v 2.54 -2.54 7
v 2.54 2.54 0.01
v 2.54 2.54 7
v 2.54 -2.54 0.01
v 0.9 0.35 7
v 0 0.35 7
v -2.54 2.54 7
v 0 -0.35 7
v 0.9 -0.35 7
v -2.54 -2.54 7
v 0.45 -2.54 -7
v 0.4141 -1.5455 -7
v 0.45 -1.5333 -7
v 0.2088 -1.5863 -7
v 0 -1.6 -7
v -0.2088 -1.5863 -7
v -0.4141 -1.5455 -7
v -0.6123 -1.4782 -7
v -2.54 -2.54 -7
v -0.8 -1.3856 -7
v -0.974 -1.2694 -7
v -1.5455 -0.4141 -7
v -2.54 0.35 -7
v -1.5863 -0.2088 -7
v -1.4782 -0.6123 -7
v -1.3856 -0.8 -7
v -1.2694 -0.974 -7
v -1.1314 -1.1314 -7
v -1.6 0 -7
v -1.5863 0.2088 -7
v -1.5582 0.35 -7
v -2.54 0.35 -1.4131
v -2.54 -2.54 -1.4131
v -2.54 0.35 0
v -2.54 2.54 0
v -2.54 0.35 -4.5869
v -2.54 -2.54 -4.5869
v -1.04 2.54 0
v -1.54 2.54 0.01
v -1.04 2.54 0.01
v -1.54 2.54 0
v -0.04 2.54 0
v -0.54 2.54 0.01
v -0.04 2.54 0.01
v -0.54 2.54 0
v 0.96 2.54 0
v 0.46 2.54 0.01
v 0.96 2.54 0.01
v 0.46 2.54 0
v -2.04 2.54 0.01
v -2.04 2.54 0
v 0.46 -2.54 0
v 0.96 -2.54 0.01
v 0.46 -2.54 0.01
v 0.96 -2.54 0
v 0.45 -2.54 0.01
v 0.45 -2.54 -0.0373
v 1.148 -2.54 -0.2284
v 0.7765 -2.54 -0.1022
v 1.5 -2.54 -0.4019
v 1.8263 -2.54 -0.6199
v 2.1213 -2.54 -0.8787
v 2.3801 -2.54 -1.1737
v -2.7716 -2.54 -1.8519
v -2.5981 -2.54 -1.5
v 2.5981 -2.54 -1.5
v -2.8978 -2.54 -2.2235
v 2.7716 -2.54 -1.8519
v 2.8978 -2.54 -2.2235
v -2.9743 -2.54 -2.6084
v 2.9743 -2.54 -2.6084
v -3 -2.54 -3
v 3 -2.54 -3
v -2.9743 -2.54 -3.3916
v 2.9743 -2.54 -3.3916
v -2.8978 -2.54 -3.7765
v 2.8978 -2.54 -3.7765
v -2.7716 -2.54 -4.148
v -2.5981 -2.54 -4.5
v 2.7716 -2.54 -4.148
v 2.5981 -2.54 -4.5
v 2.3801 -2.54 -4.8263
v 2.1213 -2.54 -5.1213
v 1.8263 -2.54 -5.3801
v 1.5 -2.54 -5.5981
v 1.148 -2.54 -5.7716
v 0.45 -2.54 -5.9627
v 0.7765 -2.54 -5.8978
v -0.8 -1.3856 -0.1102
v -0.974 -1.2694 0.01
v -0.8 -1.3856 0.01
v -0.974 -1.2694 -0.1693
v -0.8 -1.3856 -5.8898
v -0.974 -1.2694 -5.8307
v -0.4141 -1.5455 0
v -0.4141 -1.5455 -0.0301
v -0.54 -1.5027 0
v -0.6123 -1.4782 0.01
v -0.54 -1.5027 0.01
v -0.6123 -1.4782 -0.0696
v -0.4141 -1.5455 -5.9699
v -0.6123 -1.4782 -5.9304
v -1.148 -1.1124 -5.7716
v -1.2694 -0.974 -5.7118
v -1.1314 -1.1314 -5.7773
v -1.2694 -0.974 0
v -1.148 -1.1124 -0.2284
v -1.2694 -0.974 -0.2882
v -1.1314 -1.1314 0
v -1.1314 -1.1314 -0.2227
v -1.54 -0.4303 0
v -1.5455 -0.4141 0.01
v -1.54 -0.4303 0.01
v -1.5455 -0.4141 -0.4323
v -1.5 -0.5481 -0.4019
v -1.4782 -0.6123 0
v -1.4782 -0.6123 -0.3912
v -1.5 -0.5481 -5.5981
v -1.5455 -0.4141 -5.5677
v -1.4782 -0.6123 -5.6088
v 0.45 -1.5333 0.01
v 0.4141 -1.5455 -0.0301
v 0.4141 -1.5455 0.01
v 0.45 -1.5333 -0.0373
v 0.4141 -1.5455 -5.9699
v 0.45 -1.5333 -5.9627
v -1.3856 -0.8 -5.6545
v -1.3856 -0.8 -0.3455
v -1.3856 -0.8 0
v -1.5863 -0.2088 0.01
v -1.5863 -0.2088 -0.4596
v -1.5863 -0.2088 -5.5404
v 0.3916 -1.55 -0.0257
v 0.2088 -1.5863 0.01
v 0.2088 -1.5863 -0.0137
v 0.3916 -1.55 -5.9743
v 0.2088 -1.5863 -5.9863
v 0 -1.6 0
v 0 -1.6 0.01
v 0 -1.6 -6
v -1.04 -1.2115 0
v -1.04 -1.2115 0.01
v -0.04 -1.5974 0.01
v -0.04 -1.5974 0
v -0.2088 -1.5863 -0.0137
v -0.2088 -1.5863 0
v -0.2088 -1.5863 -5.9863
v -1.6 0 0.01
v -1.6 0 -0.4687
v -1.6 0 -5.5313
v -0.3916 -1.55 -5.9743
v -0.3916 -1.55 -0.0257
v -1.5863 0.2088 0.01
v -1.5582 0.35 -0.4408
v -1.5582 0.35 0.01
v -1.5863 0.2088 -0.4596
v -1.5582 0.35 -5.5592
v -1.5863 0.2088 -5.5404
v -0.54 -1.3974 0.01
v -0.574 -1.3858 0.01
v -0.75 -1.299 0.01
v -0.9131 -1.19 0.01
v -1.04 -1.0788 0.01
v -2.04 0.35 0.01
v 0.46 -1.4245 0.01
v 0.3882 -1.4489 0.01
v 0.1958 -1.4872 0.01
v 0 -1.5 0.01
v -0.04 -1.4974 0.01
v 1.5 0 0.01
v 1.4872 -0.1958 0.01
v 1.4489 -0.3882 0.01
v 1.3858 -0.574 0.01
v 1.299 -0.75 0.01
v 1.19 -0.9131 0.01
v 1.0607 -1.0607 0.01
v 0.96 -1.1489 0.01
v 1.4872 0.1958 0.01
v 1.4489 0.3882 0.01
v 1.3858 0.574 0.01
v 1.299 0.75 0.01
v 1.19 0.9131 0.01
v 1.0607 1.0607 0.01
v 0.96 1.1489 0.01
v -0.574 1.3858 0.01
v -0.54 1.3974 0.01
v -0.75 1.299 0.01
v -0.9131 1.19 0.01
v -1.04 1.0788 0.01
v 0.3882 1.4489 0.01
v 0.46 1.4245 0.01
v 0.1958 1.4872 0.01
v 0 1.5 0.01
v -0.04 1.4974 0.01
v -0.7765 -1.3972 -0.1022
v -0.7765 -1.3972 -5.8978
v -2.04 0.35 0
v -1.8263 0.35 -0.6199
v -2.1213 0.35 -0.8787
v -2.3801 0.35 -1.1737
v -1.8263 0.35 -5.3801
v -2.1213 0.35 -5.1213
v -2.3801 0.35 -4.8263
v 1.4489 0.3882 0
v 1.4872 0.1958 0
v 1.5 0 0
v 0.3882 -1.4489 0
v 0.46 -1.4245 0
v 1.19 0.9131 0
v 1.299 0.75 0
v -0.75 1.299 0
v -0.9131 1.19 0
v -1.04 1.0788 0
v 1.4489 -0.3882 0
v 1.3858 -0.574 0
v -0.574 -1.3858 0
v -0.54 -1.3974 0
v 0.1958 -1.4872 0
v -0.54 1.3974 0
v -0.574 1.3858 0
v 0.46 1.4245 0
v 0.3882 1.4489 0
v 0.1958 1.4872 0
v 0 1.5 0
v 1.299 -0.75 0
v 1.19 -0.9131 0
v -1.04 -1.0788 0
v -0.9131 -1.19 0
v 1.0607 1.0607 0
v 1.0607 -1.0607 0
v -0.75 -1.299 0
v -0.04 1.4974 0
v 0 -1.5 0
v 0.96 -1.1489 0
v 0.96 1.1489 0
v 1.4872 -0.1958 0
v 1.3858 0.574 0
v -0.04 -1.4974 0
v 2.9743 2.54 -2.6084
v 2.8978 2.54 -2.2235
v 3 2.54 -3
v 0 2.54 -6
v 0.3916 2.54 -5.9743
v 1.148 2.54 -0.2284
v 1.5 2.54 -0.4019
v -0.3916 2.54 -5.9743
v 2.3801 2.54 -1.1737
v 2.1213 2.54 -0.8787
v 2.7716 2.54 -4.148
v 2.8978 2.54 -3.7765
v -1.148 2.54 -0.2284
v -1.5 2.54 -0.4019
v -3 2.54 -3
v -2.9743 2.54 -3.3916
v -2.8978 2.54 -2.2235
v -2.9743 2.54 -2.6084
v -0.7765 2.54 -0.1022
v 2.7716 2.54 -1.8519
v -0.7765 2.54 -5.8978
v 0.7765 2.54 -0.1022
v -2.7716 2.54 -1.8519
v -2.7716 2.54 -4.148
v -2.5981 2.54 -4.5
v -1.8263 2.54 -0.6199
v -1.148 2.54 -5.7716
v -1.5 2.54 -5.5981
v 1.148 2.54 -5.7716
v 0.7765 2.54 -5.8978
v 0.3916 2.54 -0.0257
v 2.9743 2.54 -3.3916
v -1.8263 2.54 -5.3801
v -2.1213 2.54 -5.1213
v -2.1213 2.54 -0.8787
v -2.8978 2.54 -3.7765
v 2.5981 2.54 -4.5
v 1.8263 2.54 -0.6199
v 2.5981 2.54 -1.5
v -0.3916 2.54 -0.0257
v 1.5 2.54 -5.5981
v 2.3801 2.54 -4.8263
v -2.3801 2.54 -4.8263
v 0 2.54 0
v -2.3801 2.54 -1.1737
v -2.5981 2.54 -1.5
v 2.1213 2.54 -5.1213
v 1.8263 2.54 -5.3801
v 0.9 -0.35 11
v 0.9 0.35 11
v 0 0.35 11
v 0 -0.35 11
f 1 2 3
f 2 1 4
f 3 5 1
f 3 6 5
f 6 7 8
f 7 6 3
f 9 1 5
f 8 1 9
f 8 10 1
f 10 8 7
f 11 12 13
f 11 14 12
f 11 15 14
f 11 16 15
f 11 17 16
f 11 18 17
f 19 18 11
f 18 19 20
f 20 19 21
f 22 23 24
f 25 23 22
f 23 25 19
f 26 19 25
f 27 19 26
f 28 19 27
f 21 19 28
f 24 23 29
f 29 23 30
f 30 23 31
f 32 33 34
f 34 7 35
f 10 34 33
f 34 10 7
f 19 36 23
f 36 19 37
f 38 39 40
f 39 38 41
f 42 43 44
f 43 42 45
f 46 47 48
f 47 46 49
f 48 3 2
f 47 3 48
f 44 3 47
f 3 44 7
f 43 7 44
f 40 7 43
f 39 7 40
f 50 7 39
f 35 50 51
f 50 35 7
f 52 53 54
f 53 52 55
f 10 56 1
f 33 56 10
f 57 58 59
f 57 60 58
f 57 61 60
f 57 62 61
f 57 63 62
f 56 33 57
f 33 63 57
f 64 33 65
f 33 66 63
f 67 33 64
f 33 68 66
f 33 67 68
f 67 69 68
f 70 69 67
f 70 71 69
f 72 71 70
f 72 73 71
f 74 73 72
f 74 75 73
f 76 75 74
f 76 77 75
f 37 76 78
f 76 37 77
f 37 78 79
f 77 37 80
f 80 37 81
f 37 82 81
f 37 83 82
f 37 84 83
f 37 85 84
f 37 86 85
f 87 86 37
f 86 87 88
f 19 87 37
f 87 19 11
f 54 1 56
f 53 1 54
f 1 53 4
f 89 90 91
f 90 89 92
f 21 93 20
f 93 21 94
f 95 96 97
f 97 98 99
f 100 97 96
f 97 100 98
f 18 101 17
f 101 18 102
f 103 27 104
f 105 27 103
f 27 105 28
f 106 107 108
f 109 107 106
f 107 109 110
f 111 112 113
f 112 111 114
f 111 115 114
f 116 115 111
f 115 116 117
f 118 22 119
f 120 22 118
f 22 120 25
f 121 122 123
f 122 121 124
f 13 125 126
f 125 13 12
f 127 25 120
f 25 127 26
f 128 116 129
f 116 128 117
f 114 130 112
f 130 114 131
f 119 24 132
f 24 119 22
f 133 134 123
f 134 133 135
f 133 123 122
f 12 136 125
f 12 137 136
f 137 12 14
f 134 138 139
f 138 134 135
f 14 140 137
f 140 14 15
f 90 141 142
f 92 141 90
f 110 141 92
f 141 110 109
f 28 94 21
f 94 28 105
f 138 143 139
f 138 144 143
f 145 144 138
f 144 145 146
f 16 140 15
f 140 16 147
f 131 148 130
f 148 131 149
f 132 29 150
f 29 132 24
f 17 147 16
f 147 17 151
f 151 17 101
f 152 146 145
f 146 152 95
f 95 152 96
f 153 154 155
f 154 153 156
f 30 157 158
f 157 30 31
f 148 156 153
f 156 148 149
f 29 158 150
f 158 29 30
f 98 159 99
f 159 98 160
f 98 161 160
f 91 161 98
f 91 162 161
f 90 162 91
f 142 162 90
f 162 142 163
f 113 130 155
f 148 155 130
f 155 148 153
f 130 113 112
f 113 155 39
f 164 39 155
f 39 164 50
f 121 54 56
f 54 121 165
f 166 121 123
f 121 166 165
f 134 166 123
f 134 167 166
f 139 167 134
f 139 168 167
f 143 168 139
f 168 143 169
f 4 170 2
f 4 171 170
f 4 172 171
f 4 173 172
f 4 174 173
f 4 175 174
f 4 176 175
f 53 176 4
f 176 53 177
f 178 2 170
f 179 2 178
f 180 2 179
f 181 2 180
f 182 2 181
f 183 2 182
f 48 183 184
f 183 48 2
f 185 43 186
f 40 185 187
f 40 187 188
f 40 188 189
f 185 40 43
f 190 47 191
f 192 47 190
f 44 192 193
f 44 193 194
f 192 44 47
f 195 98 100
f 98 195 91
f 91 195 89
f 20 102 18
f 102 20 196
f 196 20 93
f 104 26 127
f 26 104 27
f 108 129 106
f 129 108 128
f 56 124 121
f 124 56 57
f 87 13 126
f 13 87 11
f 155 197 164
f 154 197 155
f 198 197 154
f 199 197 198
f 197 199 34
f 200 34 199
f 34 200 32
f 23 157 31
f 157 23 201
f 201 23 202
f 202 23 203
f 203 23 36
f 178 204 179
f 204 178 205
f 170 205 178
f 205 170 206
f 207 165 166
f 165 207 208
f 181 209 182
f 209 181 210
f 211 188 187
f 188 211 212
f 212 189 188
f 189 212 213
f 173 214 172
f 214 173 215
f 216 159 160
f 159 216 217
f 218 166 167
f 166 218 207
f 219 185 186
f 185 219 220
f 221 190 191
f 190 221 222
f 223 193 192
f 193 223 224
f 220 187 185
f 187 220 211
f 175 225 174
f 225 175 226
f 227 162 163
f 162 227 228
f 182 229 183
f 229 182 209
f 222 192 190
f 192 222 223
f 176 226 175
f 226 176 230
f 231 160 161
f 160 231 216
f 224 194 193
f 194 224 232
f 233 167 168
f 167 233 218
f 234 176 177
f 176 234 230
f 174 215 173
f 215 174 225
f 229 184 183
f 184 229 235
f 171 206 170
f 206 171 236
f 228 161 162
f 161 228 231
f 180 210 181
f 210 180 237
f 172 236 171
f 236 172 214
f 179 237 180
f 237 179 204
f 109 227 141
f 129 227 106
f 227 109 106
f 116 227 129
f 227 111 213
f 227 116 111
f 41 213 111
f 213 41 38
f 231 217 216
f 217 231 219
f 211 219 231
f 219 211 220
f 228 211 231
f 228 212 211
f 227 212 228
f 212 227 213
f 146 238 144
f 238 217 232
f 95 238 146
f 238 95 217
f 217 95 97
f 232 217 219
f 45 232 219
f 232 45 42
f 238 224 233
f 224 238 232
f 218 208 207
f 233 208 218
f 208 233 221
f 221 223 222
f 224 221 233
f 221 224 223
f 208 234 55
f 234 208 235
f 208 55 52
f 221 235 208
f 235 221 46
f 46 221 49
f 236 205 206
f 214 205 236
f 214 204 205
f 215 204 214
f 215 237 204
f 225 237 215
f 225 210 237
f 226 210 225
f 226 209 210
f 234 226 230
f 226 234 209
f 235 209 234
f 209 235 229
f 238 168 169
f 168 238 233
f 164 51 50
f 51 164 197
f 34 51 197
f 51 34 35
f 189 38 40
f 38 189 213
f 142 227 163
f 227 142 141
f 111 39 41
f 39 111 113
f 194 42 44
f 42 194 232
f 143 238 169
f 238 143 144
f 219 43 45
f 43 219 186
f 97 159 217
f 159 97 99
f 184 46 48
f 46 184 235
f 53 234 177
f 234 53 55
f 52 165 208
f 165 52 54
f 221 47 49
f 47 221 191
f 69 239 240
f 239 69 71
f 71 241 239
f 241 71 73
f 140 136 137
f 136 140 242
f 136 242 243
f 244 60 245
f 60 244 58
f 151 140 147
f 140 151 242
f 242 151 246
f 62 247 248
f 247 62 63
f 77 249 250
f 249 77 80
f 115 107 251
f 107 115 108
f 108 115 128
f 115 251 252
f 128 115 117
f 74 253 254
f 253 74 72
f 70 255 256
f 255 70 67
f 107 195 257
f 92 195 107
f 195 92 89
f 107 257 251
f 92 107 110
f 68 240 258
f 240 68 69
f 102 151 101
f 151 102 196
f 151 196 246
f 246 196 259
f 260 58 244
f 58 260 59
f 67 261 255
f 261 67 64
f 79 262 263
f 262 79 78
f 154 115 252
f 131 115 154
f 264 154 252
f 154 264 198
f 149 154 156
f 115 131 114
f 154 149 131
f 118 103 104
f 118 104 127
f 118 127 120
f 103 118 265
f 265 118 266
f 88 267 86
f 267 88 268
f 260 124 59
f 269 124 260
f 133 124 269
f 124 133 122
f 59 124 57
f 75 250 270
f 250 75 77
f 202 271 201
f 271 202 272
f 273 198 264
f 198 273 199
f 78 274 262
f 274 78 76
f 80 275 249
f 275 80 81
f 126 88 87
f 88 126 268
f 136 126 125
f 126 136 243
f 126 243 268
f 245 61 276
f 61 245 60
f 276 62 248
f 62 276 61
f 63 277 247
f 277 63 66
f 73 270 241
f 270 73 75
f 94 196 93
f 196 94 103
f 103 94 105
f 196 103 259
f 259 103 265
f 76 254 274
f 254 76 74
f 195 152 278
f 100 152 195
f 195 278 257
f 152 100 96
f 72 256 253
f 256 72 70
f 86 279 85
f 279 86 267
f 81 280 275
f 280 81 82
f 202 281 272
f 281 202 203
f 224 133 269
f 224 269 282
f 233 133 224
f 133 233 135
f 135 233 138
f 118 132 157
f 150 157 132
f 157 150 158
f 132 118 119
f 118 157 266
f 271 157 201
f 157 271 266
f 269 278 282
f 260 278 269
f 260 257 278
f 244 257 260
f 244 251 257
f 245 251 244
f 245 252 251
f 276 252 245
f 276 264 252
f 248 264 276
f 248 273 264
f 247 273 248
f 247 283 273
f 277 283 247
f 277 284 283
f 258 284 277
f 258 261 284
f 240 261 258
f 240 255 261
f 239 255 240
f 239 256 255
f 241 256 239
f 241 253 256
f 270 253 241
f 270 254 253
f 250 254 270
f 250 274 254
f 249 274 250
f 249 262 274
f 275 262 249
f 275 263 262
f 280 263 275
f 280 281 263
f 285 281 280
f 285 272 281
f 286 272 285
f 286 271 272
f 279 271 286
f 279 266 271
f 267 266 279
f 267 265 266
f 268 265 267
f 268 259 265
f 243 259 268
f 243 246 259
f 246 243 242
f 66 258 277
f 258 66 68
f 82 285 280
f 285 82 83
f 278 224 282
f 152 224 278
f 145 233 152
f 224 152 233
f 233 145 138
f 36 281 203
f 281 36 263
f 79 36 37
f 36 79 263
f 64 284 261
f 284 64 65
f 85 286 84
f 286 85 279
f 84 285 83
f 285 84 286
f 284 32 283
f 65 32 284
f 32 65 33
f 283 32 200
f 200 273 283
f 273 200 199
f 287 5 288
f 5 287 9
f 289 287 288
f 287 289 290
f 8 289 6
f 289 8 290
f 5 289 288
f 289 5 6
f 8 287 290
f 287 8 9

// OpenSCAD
// design calculation S5-R register unit cell -- CAD evidence for the dropout latch.
//
// This is a SINGLE-COLUMN unit cell of the shared-drive programmable rotary
// register (the S5-R pivot). It is NOT a full machine and NOT a print. Its job
// is to let the analytic printability gate read the declared feature sizes and
// to let a real OpenSCAD render + mesh-validate that the latch + rotor bank
// geometry is a closed solid at the 5.08 mm pitch.
//
// The constants below are the source of truth parsed by
// tools/validate/analytic_printability.py and recomputed by s5r_register.py.
// Keep the two in sync.
//
// EVIDENCE CLASS: CAD (this file + its STL render). Not a print, not a
//
// Units: mm. Target process: Bambu X1C, PLA, 0.4 mm nozzle (tools/fdm-limits).

PITCH = 5.08;
ROTOR_RADIUS = 1.5;
ROTOR_CORE_RADIUS = 1.0;
BASE = 2.0;
LEVELS = 5;
LEVEL_ANGLE = 360 / LEVELS;     // 72 deg

// ---- printed drive pawl (vertical cantilever, load-bearing = 2 lines) ----
PAWL_T = 0.90;                  // thickness in X (pitch direction); 2 lines
PAWL_W = 0.70;                  // width in Y (row direction)
PAWL_LEN = 8.00;                // Z extent of the cantilever
PAWL_DEFLECT = 0.10;            // working deflection off the rack tooth

// ---- keeper latch (bistable over-centre leaf, 5-position gate) ----
// design calculation re-profile (residual-KEEPER): 0.45 (1 line, RISK) -> 0.90 mm (2 lines,
// PASS); the HOLD is a hard printed shoulder in compression, so the leaf only
// trips the snap. A longer leaf (4.00) keeps the snap strain low.
KEEPER_T = 0.90;                // thickness in X (2 lines; PASS)
KEEPER_W = 0.70;                // width in Y
KEEPER_LEN = 4.00;              // Z cantilever
KEEPER_OVER_CENTRE = 0.06;      // bistability offset (snap trip only)
KEEPER_GATE_STEP = 0.35;        // spacing of the 5 gate positions
KEEPER_SHOULDER_X = 0.50;       // hard shoulder depth in X (hold, compression)

// ---- shared drive bar with rack ----
// design calculation (from design calculation bank close-out): design calculation's rack (pitch 0.60, tooth 0.45)
// left a 0.15 mm inter-tooth gap that FUSES at a 0.4 mm nozzle (< 0.44 mm line).
// Re-dimensioned to pitch 1.00 / tooth 0.50 -> 0.50 mm gap. The per-stroke
// advance is therefore 1.00 mm (one tooth) instead of 0.60 mm.
RACK_TOOTH_PITCH = 1.00;
RACK_TOOTH_HEIGHT = 0.50;
BAR_D = 6.0;                    // sourced steel drive rod d=6 (design calculation); a round bar
BAR_H = BAR_D;                  // (round steel; replaces the 3x2 printed placeholder)
BAR_W = PITCH;                  // bar spans one column here; real bar is 80xR

// ---- housing ----
CELL_H = 7.0;
WALL = 0.90;                    // robust infill-free wall (>= 2 lines)
SLOT_CLEAR = 0.15;              // guide clearance (worst case >= 0.20 after print)
ROTOR_BORE_CLEAR = 0.40;        // total diametral rotor-to-bore free play

$fn = 48;
EPS = 0.01;

module rotor() {
    cylinder(r = ROTOR_RADIUS, h = BASE);
    translate([0, 0, BASE]) cylinder(r = ROTOR_CORE_RADIUS, h = CELL_H - BASE);
}

module pawl() {
    // a thin vertical leaf, attached to the hub at its top, tip down at the rack
    translate([0, -PAWL_W / 2, 0]) cube([PAWL_T, PAWL_W, PAWL_LEN]);
}

module keeper() {
    // design calculation: the keeper leaf is re-profiled into the ROW (Y) direction, beside
    // the pawl, so it does not consume the pitch-direction (X) band. Its
    // thickness in Y is KEEPER_T (2 lines, 0.90).
    translate([0, PAWL_W + KEEPER_OVER_CENTRE, 0])
        cube([KEEPER_T, KEEPER_T, KEEPER_LEN]);
    // gate nose: 5 stacked positions (the writer moves the keeper index)
    for (k = [0:LEVELS - 1])
        translate([0, PAWL_W + KEEPER_OVER_CENTRE + KEEPER_T,
                   k * KEEPER_GATE_STEP])
            cube([KEEPER_T, 0.20, 0.15]);
    // hard printed shoulder: takes the pawl push-out in COMPRESSION when the
    // keeper is dropped out (the hold does not depend on the over-centre offset)
    translate([0, PAWL_W + KEEPER_OVER_CENTRE, -KEEPER_SHOULDER_X])
        cube([KEEPER_T, KEEPER_SHOULDER_X, KEEPER_SHOULDER_X]);
}

module drive_bar() {
    // the toothed rack under the pawl tip. design calculation: the bar is a SOURCED STEEL
    // ROD (d=6 mm), modelled here as the round bar body; the rack teeth are the
    // corrected 1.00/0.50 pitch/height.
    translate([0, 0, -BAR_H / 2]) rotate([90, 0, 0])
        cylinder(r = BAR_D / 2, h = BAR_W, center = true);
    for (t = [0:3])
        translate([-BAR_W / 2 + t * RACK_TOOTH_PITCH, -BAR_W / 2, 0])
            cube([RACK_TOOTH_HEIGHT, BAR_W, RACK_TOOTH_HEIGHT]);
}

module cell() {
    // housing: a square tube with a floor, open toward +Z for the rotor
    difference() {
        translate([-PITCH / 2, -PITCH / 2, -BAR_H - 1])
            cube([PITCH, PITCH, CELL_H + BAR_H + 1]);
        // rotor bore
        translate([0, 0, -BAR_H - 1 - EPS]) cylinder(r = ROTOR_RADIUS + 0.10,
                                                     h = CELL_H + 2 * EPS);
        // pawl side chamber (open slot, +X)
        translate([PAWL_T / 2, -PITCH / 2 - EPS, -BAR_H - 1 - EPS])
            cube([PITCH / 2, PITCH + 2 * EPS, CELL_H + 2 * EPS]);
        // keeper side chamber (open slot, +Y; design calculation keeper moved to the row
        // direction so it does not consume the pitch-direction band)
        translate([-PITCH / 2 - EPS, PAWL_W / 2, -BAR_H - 1 - EPS])
            cube([PITCH + 2 * EPS, PITCH / 2, CELL_H + 2 * EPS]);
    }
}

module unit_cell_assembly() {
    cell();
    rotor();
    translate([0, 0, BASE + 1]) pawl();
    translate([0, 0, BASE + 1]) keeper();
    drive_bar();
}

// part = "cell" | "assembly" | "pawl" | "keeper";
part = "assembly";

if (part == "assembly") {
    unit_cell_assembly();
} else if (part == "cell") {
    cell();
} else if (part == "pawl") {
    pawl();
} else if (part == "keeper") {
    keeper();
}
